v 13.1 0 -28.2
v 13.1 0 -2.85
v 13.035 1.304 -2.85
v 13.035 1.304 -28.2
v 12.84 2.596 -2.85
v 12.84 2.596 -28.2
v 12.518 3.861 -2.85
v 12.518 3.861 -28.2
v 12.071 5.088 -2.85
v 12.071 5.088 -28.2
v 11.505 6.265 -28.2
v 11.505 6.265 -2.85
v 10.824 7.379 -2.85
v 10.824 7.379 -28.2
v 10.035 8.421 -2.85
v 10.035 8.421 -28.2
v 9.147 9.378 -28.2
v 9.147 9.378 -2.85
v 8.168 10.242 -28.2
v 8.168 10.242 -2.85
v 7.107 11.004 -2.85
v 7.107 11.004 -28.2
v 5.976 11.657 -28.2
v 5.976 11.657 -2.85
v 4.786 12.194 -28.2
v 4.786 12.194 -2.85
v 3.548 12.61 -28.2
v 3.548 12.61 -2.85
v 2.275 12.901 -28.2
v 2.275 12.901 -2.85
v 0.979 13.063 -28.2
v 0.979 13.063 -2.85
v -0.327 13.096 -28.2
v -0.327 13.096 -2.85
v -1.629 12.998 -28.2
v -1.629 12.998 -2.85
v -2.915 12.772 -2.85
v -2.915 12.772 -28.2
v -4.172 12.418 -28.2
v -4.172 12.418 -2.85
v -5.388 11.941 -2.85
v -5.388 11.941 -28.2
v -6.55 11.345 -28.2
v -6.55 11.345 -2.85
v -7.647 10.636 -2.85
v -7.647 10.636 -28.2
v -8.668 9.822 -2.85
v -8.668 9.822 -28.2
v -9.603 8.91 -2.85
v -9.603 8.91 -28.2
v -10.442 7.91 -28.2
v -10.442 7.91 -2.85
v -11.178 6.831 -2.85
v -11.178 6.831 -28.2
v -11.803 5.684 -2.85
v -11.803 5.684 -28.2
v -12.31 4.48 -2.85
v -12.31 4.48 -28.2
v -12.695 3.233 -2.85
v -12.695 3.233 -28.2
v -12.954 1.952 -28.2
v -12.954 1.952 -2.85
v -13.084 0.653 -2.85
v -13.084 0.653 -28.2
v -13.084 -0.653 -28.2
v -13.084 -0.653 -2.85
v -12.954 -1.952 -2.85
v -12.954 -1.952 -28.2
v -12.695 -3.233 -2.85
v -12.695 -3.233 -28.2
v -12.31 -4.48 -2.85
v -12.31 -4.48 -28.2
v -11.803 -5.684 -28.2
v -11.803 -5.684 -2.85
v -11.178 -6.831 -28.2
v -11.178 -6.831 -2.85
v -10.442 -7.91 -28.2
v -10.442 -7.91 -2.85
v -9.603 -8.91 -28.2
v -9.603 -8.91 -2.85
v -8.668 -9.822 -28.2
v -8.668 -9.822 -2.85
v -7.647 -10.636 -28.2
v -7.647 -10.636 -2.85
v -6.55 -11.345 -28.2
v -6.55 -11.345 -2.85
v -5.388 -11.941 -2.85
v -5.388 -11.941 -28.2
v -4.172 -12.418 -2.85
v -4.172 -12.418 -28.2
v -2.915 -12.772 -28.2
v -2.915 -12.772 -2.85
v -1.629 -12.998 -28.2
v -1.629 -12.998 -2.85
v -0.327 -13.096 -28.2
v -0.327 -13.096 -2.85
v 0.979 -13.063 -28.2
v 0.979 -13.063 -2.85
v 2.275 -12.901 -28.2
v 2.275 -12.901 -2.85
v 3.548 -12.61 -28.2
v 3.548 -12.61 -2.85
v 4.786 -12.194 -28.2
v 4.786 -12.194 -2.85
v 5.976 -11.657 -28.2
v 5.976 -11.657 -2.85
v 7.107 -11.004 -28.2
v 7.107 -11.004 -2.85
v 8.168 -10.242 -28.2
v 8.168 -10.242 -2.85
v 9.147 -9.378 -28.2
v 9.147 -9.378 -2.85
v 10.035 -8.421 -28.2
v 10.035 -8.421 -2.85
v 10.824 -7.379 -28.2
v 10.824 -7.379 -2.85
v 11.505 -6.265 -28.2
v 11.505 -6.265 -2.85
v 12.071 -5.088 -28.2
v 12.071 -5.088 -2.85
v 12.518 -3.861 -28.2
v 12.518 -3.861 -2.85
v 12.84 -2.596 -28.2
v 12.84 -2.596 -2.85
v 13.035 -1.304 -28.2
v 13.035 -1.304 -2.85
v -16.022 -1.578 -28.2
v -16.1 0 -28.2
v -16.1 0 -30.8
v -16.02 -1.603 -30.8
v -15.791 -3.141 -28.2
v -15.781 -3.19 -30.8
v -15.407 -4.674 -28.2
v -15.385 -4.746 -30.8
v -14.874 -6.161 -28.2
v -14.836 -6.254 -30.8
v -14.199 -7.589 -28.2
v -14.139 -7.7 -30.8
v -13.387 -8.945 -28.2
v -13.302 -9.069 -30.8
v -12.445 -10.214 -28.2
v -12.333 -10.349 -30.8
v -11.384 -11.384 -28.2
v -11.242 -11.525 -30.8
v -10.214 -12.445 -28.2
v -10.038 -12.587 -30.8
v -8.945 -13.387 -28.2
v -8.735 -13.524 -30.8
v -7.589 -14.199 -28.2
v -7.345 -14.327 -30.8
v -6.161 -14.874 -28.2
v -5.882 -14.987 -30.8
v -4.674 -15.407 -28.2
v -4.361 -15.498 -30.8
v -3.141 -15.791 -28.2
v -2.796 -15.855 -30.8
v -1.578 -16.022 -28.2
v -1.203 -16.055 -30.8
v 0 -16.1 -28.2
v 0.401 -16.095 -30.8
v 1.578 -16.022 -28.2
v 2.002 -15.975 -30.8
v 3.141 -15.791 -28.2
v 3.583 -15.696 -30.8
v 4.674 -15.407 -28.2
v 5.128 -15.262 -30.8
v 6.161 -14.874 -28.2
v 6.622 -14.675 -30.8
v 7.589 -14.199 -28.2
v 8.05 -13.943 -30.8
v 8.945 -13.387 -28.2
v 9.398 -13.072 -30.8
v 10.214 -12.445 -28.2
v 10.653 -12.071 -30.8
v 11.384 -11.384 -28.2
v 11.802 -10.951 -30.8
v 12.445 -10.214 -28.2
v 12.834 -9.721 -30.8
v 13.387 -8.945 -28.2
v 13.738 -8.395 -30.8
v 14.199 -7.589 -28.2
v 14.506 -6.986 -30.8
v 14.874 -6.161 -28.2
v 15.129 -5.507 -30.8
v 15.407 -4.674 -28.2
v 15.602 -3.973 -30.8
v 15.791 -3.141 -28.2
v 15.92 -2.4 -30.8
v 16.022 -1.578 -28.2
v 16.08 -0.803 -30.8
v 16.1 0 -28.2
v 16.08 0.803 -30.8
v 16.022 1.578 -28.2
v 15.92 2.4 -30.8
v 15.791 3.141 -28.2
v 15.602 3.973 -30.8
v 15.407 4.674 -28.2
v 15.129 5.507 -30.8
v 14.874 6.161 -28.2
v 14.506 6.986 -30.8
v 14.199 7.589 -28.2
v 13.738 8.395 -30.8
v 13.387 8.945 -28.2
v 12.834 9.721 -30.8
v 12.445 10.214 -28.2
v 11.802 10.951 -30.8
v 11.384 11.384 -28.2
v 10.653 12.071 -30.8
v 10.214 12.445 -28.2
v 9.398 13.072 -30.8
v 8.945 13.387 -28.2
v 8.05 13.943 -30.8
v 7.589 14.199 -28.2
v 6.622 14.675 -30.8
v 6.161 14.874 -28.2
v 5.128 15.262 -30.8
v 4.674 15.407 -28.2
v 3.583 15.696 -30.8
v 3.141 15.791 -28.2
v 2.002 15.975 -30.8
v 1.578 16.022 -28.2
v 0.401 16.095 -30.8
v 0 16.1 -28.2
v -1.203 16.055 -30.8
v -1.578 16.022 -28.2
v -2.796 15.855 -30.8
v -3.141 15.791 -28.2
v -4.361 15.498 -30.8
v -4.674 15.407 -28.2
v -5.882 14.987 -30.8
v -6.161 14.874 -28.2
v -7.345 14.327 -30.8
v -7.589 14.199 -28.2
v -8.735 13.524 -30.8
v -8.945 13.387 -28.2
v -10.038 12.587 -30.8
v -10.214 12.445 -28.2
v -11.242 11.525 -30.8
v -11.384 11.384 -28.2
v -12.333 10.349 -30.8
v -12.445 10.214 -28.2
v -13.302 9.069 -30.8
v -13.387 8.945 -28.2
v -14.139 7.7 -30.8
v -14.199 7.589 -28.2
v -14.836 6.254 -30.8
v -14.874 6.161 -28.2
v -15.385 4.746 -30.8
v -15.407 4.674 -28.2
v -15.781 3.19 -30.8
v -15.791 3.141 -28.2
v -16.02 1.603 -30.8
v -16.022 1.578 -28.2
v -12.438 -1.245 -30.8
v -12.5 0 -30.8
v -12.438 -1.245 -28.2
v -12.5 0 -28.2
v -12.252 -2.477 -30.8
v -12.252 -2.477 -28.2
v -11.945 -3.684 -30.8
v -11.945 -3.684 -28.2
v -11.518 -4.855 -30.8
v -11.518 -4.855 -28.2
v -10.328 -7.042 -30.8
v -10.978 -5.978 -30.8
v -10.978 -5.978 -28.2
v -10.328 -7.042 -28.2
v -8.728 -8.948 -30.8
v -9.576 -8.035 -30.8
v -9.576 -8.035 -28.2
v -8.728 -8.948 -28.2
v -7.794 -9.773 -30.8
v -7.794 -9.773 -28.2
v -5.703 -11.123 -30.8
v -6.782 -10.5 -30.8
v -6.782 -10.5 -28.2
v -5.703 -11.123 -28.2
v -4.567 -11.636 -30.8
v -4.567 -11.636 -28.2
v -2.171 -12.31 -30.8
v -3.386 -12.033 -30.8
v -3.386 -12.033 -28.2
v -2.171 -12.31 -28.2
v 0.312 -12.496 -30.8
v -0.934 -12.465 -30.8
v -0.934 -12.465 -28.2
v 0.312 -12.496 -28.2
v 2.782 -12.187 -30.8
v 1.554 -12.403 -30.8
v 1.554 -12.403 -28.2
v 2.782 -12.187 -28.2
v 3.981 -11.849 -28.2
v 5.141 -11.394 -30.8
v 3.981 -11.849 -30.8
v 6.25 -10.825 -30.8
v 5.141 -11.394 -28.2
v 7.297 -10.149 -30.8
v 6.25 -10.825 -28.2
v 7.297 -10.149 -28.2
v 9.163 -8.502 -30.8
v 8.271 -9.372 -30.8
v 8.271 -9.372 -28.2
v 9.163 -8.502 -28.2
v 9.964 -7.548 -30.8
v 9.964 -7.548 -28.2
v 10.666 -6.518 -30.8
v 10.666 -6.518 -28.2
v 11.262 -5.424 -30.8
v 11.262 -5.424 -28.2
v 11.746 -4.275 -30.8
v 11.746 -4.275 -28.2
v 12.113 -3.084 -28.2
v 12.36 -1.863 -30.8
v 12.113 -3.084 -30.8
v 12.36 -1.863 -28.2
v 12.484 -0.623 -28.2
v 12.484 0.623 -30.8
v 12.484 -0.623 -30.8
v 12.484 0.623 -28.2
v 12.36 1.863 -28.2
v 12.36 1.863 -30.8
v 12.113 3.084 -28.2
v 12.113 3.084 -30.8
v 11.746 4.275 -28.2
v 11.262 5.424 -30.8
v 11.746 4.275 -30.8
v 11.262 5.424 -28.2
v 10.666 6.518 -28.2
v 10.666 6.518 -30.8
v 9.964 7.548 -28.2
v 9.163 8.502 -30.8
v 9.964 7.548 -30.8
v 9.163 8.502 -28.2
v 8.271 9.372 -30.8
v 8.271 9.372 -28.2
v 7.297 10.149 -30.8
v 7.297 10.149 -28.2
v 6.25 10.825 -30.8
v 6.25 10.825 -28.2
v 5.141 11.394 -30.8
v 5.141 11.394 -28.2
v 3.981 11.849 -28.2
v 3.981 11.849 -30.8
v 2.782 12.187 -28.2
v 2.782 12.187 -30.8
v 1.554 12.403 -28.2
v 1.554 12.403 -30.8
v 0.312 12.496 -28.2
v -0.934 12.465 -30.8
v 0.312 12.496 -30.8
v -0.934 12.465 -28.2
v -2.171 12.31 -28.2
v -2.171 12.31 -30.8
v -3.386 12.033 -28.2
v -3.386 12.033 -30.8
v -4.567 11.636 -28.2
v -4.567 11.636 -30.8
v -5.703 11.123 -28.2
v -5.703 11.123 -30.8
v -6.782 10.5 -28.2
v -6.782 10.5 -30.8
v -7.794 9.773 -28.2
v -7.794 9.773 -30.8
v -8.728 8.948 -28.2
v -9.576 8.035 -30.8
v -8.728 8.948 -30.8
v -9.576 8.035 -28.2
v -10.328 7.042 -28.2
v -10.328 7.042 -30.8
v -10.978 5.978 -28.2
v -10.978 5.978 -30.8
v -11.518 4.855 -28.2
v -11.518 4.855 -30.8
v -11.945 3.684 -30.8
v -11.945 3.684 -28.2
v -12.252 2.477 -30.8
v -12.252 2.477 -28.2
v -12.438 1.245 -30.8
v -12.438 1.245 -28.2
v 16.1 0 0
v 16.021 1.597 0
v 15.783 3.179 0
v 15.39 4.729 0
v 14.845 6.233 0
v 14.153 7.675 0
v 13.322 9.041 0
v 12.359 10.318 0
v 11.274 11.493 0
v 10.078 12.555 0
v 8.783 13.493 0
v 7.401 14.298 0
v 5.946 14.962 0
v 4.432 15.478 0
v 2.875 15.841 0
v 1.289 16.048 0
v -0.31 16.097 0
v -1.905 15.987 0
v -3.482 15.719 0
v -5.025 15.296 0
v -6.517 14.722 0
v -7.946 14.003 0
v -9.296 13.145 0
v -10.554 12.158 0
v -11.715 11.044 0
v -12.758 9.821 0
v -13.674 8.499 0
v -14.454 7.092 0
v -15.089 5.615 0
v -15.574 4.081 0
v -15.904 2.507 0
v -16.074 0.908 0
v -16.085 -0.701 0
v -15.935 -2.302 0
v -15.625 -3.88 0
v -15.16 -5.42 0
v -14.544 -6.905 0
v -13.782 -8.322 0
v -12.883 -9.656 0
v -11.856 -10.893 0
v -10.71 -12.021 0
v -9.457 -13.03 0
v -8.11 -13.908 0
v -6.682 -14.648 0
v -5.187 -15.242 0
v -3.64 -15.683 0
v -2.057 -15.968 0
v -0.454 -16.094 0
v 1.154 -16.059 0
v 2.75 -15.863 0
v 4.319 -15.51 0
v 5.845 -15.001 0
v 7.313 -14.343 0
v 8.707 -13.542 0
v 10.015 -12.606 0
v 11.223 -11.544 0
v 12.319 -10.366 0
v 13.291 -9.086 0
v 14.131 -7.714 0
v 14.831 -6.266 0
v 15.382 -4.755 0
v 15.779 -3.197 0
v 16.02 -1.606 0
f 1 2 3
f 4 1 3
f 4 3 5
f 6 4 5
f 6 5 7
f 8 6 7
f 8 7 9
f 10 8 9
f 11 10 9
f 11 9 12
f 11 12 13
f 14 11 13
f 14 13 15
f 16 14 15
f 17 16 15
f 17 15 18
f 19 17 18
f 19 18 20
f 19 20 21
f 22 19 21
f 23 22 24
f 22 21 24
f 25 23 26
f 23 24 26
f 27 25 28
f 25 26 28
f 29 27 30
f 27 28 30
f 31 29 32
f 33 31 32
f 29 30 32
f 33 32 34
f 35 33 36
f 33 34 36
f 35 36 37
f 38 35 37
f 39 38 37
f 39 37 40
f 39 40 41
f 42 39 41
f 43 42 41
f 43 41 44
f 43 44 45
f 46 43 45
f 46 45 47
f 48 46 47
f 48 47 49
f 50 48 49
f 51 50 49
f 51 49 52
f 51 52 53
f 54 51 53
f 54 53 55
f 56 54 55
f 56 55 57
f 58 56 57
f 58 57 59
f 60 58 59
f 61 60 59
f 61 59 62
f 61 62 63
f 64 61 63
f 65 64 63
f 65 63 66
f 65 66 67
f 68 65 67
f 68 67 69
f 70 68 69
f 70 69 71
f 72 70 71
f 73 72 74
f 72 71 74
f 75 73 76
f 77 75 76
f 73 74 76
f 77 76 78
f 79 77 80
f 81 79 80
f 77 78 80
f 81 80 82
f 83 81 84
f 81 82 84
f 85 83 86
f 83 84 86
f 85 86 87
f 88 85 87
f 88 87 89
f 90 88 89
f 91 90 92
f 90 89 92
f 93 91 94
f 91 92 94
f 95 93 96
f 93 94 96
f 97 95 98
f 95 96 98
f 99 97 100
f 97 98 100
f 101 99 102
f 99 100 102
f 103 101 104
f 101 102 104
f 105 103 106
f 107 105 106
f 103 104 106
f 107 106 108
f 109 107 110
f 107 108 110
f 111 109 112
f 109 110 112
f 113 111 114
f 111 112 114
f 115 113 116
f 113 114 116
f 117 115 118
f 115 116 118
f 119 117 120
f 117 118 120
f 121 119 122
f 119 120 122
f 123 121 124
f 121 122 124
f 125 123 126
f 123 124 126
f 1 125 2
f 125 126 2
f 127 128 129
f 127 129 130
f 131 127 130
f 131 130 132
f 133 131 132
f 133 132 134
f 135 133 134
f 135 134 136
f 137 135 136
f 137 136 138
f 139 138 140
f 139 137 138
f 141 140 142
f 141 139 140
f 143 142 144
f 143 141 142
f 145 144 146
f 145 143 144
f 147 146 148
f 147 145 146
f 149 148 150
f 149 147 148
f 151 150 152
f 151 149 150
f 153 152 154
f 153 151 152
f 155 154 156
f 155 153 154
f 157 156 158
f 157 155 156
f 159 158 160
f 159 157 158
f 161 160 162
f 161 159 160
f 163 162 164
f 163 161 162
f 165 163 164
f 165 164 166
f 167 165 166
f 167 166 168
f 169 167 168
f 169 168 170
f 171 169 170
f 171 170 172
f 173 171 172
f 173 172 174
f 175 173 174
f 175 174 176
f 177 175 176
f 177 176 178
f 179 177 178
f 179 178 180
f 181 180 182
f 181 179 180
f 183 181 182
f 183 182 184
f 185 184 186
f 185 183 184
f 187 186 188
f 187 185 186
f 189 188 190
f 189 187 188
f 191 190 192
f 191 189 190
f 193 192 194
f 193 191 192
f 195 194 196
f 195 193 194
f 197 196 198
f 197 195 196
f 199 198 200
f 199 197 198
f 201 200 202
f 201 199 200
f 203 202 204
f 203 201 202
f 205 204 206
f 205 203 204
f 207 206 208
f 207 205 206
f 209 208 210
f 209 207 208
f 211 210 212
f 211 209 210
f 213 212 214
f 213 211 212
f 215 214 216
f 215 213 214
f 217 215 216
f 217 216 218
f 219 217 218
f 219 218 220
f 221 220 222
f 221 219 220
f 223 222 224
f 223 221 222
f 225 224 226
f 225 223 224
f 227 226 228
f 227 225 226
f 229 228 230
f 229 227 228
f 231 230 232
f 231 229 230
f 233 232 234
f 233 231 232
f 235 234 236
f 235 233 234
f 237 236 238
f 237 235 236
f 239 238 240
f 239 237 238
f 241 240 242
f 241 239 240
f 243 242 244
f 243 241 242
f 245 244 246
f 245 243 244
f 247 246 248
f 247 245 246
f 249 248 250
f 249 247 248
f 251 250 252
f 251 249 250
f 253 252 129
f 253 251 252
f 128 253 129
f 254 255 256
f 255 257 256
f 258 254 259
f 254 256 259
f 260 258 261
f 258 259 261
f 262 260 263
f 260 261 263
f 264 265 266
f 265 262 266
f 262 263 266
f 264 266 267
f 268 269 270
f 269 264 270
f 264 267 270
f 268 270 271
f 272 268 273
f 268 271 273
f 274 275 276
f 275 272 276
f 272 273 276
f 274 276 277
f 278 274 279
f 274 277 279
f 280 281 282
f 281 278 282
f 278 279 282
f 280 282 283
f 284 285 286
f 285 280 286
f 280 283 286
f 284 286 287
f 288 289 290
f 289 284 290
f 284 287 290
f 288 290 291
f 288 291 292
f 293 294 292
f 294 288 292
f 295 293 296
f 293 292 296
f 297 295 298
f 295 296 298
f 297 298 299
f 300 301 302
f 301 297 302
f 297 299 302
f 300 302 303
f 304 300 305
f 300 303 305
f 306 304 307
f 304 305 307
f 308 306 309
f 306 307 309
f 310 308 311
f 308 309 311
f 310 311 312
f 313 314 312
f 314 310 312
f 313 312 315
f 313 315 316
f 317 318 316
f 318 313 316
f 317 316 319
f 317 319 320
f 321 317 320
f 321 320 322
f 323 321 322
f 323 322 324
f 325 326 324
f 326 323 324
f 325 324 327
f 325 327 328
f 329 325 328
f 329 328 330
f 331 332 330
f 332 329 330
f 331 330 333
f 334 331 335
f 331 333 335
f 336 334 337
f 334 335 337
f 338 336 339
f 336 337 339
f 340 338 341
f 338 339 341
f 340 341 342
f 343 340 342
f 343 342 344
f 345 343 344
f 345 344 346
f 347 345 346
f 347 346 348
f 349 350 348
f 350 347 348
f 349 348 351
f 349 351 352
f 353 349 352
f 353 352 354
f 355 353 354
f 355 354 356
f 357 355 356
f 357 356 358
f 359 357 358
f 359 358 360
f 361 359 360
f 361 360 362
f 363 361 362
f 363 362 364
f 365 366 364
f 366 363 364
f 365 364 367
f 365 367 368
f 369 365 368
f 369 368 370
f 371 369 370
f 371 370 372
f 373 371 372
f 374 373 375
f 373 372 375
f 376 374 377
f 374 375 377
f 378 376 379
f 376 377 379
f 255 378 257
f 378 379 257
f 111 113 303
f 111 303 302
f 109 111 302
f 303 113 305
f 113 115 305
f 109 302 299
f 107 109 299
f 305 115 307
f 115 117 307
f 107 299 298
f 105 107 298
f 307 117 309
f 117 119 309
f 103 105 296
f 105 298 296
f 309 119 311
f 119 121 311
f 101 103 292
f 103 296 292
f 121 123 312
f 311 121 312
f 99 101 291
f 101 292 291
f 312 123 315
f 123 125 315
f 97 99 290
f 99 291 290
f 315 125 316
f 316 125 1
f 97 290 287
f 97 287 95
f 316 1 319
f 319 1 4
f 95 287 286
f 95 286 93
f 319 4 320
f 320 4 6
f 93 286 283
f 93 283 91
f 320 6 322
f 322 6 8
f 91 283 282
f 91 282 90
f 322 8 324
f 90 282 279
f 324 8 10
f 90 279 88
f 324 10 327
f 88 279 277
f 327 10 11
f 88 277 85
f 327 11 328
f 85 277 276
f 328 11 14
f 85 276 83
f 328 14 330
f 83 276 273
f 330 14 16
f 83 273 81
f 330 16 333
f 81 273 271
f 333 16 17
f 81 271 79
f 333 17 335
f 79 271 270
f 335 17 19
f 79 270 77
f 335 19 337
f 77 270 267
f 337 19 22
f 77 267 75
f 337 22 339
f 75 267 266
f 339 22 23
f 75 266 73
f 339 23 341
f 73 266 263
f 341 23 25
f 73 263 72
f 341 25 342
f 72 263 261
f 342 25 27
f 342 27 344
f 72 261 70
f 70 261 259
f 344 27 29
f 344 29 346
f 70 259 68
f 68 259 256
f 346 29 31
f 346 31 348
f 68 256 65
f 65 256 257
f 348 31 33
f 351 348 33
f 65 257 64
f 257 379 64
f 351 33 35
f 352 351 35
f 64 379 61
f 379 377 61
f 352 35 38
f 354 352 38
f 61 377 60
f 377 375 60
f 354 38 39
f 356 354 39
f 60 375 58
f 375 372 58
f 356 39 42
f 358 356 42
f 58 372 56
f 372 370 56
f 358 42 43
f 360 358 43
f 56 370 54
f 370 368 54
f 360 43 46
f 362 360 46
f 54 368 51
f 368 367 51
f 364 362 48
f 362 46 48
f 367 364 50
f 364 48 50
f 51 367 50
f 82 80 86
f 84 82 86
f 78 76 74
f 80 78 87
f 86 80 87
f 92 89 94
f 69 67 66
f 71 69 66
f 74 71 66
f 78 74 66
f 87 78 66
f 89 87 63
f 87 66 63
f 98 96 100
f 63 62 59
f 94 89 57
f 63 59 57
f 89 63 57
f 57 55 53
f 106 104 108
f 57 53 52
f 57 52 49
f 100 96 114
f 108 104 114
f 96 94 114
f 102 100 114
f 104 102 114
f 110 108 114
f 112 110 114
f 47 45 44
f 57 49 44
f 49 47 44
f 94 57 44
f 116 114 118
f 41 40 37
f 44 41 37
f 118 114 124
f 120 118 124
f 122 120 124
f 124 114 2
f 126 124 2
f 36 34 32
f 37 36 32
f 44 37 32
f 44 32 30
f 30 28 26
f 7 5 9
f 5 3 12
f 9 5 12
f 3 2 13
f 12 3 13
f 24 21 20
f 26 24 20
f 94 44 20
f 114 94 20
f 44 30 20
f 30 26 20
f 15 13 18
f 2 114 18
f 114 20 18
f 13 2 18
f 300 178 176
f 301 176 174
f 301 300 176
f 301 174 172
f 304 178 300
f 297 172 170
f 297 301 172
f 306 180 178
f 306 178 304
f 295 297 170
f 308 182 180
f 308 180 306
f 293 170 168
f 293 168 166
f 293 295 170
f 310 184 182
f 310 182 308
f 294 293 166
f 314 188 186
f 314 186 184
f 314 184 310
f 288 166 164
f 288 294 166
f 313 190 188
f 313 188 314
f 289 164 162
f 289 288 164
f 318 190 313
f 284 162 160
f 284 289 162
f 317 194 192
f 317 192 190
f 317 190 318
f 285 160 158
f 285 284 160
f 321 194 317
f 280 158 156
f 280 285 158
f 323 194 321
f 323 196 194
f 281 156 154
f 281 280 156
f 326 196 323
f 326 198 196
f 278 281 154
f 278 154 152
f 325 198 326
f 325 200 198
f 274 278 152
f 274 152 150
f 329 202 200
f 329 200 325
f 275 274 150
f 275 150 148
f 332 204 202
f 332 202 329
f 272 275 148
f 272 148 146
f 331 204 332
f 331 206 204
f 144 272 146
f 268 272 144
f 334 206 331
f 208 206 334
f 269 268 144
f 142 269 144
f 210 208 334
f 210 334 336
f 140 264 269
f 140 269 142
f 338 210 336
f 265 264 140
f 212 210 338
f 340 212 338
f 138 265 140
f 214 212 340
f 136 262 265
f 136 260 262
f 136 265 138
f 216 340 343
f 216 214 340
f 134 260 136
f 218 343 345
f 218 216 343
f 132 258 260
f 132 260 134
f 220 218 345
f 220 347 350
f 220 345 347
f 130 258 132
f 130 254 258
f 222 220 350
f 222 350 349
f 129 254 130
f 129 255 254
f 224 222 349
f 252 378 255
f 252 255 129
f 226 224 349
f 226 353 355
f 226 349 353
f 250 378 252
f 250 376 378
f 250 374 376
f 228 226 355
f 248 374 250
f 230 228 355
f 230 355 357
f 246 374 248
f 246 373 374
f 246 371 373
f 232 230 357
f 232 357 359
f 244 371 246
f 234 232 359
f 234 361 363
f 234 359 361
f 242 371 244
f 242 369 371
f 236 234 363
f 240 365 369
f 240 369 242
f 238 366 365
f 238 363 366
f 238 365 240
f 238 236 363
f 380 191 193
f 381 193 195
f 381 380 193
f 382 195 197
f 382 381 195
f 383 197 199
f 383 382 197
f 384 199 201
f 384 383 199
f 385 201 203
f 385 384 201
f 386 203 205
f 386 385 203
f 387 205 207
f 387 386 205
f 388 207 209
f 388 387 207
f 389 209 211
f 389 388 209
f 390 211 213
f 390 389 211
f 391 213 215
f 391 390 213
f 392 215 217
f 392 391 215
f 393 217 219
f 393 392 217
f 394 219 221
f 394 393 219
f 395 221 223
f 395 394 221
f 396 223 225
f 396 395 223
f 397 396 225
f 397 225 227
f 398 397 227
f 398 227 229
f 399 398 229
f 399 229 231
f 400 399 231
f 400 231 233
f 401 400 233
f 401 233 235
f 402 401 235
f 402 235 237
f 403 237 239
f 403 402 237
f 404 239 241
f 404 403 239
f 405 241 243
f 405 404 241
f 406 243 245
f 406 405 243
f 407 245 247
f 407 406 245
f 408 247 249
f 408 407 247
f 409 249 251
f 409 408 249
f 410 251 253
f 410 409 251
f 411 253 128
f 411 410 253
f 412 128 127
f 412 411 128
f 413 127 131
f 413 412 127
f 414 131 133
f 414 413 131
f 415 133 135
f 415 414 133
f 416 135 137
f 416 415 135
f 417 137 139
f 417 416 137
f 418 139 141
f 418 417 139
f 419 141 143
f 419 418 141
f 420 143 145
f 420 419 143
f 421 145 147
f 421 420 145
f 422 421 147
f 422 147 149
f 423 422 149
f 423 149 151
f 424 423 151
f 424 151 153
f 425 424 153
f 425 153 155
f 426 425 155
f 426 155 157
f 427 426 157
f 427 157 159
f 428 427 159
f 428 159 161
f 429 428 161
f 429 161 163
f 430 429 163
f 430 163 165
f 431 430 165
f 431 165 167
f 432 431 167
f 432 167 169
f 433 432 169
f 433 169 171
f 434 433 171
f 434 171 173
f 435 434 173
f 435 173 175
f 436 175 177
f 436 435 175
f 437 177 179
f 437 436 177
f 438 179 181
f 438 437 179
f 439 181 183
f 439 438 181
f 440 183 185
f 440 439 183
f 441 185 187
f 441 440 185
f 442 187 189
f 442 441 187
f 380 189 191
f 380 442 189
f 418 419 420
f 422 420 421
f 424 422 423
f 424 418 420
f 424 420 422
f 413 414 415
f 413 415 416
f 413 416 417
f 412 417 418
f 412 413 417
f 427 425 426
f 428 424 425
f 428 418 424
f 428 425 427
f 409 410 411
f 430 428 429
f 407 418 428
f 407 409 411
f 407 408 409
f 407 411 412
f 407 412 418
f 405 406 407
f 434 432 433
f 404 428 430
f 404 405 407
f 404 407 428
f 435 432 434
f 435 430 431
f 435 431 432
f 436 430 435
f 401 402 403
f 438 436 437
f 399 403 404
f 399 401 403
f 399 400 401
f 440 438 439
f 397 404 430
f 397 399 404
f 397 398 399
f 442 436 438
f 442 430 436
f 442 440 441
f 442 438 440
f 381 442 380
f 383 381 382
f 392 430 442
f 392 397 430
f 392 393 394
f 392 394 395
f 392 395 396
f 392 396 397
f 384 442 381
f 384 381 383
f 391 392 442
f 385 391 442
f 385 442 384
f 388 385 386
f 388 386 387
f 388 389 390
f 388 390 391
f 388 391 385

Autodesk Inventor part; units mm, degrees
ref_plane "YZ Plane" through (0, 0, 0) normal (1, 0, 0) x (0, 1, 0)
ref_plane "XZ Plane" through (0, 0, 0) normal (0, 1, 0) x (-1, 0, 0)
ref_plane "XY Plane" through (0, 0, 0) normal (0, 0, 1) x (1, 0, 0)
sketch "Sketch1" plane through (0, 0, 0) normal (0, 0, 1) x (1, 0, 0)
  circle A0 centre (0, 0) radius 13.1 projected
  line L0 (0, 0) -> (-8.5876, 9.8926)
  line L1 (-8.5876, 9.8926) -> (-10.5542, 12.1581)
  circle A1 centre (0, 0) radius 16.1
  point P0 (0, 0)
  dimension "d0" = 3
extrude "Extrusion1" add sketch "Sketch1" against normal blind 28.2
sketch "Sketch2" plane through (0, 0, 0) normal (0, 0, 1) x (1, 0, 0)
  circle A0 centre (0, 0) radius 13.1 projected
  point P0 (0, 0)
extrude "Extrusion2" add sketch "Sketch2" against normal blind 2.85
sketch "Sketch4" plane through (0, 0, -28.2) normal (0, 0, -1) x (-1, 0, 0)
  circle A0 centre (0, 0) radius 16.1 projected
  circle A1 centre (0, 0) radius 13.1 projected
  circle A2 centre (0, 0) radius 12.5
  point P0 (0, 0)
extrude "Extrusion3" add sketch "Sketch4" along normal blind 2.6 contours A0 | A1
properties part number "opona"
